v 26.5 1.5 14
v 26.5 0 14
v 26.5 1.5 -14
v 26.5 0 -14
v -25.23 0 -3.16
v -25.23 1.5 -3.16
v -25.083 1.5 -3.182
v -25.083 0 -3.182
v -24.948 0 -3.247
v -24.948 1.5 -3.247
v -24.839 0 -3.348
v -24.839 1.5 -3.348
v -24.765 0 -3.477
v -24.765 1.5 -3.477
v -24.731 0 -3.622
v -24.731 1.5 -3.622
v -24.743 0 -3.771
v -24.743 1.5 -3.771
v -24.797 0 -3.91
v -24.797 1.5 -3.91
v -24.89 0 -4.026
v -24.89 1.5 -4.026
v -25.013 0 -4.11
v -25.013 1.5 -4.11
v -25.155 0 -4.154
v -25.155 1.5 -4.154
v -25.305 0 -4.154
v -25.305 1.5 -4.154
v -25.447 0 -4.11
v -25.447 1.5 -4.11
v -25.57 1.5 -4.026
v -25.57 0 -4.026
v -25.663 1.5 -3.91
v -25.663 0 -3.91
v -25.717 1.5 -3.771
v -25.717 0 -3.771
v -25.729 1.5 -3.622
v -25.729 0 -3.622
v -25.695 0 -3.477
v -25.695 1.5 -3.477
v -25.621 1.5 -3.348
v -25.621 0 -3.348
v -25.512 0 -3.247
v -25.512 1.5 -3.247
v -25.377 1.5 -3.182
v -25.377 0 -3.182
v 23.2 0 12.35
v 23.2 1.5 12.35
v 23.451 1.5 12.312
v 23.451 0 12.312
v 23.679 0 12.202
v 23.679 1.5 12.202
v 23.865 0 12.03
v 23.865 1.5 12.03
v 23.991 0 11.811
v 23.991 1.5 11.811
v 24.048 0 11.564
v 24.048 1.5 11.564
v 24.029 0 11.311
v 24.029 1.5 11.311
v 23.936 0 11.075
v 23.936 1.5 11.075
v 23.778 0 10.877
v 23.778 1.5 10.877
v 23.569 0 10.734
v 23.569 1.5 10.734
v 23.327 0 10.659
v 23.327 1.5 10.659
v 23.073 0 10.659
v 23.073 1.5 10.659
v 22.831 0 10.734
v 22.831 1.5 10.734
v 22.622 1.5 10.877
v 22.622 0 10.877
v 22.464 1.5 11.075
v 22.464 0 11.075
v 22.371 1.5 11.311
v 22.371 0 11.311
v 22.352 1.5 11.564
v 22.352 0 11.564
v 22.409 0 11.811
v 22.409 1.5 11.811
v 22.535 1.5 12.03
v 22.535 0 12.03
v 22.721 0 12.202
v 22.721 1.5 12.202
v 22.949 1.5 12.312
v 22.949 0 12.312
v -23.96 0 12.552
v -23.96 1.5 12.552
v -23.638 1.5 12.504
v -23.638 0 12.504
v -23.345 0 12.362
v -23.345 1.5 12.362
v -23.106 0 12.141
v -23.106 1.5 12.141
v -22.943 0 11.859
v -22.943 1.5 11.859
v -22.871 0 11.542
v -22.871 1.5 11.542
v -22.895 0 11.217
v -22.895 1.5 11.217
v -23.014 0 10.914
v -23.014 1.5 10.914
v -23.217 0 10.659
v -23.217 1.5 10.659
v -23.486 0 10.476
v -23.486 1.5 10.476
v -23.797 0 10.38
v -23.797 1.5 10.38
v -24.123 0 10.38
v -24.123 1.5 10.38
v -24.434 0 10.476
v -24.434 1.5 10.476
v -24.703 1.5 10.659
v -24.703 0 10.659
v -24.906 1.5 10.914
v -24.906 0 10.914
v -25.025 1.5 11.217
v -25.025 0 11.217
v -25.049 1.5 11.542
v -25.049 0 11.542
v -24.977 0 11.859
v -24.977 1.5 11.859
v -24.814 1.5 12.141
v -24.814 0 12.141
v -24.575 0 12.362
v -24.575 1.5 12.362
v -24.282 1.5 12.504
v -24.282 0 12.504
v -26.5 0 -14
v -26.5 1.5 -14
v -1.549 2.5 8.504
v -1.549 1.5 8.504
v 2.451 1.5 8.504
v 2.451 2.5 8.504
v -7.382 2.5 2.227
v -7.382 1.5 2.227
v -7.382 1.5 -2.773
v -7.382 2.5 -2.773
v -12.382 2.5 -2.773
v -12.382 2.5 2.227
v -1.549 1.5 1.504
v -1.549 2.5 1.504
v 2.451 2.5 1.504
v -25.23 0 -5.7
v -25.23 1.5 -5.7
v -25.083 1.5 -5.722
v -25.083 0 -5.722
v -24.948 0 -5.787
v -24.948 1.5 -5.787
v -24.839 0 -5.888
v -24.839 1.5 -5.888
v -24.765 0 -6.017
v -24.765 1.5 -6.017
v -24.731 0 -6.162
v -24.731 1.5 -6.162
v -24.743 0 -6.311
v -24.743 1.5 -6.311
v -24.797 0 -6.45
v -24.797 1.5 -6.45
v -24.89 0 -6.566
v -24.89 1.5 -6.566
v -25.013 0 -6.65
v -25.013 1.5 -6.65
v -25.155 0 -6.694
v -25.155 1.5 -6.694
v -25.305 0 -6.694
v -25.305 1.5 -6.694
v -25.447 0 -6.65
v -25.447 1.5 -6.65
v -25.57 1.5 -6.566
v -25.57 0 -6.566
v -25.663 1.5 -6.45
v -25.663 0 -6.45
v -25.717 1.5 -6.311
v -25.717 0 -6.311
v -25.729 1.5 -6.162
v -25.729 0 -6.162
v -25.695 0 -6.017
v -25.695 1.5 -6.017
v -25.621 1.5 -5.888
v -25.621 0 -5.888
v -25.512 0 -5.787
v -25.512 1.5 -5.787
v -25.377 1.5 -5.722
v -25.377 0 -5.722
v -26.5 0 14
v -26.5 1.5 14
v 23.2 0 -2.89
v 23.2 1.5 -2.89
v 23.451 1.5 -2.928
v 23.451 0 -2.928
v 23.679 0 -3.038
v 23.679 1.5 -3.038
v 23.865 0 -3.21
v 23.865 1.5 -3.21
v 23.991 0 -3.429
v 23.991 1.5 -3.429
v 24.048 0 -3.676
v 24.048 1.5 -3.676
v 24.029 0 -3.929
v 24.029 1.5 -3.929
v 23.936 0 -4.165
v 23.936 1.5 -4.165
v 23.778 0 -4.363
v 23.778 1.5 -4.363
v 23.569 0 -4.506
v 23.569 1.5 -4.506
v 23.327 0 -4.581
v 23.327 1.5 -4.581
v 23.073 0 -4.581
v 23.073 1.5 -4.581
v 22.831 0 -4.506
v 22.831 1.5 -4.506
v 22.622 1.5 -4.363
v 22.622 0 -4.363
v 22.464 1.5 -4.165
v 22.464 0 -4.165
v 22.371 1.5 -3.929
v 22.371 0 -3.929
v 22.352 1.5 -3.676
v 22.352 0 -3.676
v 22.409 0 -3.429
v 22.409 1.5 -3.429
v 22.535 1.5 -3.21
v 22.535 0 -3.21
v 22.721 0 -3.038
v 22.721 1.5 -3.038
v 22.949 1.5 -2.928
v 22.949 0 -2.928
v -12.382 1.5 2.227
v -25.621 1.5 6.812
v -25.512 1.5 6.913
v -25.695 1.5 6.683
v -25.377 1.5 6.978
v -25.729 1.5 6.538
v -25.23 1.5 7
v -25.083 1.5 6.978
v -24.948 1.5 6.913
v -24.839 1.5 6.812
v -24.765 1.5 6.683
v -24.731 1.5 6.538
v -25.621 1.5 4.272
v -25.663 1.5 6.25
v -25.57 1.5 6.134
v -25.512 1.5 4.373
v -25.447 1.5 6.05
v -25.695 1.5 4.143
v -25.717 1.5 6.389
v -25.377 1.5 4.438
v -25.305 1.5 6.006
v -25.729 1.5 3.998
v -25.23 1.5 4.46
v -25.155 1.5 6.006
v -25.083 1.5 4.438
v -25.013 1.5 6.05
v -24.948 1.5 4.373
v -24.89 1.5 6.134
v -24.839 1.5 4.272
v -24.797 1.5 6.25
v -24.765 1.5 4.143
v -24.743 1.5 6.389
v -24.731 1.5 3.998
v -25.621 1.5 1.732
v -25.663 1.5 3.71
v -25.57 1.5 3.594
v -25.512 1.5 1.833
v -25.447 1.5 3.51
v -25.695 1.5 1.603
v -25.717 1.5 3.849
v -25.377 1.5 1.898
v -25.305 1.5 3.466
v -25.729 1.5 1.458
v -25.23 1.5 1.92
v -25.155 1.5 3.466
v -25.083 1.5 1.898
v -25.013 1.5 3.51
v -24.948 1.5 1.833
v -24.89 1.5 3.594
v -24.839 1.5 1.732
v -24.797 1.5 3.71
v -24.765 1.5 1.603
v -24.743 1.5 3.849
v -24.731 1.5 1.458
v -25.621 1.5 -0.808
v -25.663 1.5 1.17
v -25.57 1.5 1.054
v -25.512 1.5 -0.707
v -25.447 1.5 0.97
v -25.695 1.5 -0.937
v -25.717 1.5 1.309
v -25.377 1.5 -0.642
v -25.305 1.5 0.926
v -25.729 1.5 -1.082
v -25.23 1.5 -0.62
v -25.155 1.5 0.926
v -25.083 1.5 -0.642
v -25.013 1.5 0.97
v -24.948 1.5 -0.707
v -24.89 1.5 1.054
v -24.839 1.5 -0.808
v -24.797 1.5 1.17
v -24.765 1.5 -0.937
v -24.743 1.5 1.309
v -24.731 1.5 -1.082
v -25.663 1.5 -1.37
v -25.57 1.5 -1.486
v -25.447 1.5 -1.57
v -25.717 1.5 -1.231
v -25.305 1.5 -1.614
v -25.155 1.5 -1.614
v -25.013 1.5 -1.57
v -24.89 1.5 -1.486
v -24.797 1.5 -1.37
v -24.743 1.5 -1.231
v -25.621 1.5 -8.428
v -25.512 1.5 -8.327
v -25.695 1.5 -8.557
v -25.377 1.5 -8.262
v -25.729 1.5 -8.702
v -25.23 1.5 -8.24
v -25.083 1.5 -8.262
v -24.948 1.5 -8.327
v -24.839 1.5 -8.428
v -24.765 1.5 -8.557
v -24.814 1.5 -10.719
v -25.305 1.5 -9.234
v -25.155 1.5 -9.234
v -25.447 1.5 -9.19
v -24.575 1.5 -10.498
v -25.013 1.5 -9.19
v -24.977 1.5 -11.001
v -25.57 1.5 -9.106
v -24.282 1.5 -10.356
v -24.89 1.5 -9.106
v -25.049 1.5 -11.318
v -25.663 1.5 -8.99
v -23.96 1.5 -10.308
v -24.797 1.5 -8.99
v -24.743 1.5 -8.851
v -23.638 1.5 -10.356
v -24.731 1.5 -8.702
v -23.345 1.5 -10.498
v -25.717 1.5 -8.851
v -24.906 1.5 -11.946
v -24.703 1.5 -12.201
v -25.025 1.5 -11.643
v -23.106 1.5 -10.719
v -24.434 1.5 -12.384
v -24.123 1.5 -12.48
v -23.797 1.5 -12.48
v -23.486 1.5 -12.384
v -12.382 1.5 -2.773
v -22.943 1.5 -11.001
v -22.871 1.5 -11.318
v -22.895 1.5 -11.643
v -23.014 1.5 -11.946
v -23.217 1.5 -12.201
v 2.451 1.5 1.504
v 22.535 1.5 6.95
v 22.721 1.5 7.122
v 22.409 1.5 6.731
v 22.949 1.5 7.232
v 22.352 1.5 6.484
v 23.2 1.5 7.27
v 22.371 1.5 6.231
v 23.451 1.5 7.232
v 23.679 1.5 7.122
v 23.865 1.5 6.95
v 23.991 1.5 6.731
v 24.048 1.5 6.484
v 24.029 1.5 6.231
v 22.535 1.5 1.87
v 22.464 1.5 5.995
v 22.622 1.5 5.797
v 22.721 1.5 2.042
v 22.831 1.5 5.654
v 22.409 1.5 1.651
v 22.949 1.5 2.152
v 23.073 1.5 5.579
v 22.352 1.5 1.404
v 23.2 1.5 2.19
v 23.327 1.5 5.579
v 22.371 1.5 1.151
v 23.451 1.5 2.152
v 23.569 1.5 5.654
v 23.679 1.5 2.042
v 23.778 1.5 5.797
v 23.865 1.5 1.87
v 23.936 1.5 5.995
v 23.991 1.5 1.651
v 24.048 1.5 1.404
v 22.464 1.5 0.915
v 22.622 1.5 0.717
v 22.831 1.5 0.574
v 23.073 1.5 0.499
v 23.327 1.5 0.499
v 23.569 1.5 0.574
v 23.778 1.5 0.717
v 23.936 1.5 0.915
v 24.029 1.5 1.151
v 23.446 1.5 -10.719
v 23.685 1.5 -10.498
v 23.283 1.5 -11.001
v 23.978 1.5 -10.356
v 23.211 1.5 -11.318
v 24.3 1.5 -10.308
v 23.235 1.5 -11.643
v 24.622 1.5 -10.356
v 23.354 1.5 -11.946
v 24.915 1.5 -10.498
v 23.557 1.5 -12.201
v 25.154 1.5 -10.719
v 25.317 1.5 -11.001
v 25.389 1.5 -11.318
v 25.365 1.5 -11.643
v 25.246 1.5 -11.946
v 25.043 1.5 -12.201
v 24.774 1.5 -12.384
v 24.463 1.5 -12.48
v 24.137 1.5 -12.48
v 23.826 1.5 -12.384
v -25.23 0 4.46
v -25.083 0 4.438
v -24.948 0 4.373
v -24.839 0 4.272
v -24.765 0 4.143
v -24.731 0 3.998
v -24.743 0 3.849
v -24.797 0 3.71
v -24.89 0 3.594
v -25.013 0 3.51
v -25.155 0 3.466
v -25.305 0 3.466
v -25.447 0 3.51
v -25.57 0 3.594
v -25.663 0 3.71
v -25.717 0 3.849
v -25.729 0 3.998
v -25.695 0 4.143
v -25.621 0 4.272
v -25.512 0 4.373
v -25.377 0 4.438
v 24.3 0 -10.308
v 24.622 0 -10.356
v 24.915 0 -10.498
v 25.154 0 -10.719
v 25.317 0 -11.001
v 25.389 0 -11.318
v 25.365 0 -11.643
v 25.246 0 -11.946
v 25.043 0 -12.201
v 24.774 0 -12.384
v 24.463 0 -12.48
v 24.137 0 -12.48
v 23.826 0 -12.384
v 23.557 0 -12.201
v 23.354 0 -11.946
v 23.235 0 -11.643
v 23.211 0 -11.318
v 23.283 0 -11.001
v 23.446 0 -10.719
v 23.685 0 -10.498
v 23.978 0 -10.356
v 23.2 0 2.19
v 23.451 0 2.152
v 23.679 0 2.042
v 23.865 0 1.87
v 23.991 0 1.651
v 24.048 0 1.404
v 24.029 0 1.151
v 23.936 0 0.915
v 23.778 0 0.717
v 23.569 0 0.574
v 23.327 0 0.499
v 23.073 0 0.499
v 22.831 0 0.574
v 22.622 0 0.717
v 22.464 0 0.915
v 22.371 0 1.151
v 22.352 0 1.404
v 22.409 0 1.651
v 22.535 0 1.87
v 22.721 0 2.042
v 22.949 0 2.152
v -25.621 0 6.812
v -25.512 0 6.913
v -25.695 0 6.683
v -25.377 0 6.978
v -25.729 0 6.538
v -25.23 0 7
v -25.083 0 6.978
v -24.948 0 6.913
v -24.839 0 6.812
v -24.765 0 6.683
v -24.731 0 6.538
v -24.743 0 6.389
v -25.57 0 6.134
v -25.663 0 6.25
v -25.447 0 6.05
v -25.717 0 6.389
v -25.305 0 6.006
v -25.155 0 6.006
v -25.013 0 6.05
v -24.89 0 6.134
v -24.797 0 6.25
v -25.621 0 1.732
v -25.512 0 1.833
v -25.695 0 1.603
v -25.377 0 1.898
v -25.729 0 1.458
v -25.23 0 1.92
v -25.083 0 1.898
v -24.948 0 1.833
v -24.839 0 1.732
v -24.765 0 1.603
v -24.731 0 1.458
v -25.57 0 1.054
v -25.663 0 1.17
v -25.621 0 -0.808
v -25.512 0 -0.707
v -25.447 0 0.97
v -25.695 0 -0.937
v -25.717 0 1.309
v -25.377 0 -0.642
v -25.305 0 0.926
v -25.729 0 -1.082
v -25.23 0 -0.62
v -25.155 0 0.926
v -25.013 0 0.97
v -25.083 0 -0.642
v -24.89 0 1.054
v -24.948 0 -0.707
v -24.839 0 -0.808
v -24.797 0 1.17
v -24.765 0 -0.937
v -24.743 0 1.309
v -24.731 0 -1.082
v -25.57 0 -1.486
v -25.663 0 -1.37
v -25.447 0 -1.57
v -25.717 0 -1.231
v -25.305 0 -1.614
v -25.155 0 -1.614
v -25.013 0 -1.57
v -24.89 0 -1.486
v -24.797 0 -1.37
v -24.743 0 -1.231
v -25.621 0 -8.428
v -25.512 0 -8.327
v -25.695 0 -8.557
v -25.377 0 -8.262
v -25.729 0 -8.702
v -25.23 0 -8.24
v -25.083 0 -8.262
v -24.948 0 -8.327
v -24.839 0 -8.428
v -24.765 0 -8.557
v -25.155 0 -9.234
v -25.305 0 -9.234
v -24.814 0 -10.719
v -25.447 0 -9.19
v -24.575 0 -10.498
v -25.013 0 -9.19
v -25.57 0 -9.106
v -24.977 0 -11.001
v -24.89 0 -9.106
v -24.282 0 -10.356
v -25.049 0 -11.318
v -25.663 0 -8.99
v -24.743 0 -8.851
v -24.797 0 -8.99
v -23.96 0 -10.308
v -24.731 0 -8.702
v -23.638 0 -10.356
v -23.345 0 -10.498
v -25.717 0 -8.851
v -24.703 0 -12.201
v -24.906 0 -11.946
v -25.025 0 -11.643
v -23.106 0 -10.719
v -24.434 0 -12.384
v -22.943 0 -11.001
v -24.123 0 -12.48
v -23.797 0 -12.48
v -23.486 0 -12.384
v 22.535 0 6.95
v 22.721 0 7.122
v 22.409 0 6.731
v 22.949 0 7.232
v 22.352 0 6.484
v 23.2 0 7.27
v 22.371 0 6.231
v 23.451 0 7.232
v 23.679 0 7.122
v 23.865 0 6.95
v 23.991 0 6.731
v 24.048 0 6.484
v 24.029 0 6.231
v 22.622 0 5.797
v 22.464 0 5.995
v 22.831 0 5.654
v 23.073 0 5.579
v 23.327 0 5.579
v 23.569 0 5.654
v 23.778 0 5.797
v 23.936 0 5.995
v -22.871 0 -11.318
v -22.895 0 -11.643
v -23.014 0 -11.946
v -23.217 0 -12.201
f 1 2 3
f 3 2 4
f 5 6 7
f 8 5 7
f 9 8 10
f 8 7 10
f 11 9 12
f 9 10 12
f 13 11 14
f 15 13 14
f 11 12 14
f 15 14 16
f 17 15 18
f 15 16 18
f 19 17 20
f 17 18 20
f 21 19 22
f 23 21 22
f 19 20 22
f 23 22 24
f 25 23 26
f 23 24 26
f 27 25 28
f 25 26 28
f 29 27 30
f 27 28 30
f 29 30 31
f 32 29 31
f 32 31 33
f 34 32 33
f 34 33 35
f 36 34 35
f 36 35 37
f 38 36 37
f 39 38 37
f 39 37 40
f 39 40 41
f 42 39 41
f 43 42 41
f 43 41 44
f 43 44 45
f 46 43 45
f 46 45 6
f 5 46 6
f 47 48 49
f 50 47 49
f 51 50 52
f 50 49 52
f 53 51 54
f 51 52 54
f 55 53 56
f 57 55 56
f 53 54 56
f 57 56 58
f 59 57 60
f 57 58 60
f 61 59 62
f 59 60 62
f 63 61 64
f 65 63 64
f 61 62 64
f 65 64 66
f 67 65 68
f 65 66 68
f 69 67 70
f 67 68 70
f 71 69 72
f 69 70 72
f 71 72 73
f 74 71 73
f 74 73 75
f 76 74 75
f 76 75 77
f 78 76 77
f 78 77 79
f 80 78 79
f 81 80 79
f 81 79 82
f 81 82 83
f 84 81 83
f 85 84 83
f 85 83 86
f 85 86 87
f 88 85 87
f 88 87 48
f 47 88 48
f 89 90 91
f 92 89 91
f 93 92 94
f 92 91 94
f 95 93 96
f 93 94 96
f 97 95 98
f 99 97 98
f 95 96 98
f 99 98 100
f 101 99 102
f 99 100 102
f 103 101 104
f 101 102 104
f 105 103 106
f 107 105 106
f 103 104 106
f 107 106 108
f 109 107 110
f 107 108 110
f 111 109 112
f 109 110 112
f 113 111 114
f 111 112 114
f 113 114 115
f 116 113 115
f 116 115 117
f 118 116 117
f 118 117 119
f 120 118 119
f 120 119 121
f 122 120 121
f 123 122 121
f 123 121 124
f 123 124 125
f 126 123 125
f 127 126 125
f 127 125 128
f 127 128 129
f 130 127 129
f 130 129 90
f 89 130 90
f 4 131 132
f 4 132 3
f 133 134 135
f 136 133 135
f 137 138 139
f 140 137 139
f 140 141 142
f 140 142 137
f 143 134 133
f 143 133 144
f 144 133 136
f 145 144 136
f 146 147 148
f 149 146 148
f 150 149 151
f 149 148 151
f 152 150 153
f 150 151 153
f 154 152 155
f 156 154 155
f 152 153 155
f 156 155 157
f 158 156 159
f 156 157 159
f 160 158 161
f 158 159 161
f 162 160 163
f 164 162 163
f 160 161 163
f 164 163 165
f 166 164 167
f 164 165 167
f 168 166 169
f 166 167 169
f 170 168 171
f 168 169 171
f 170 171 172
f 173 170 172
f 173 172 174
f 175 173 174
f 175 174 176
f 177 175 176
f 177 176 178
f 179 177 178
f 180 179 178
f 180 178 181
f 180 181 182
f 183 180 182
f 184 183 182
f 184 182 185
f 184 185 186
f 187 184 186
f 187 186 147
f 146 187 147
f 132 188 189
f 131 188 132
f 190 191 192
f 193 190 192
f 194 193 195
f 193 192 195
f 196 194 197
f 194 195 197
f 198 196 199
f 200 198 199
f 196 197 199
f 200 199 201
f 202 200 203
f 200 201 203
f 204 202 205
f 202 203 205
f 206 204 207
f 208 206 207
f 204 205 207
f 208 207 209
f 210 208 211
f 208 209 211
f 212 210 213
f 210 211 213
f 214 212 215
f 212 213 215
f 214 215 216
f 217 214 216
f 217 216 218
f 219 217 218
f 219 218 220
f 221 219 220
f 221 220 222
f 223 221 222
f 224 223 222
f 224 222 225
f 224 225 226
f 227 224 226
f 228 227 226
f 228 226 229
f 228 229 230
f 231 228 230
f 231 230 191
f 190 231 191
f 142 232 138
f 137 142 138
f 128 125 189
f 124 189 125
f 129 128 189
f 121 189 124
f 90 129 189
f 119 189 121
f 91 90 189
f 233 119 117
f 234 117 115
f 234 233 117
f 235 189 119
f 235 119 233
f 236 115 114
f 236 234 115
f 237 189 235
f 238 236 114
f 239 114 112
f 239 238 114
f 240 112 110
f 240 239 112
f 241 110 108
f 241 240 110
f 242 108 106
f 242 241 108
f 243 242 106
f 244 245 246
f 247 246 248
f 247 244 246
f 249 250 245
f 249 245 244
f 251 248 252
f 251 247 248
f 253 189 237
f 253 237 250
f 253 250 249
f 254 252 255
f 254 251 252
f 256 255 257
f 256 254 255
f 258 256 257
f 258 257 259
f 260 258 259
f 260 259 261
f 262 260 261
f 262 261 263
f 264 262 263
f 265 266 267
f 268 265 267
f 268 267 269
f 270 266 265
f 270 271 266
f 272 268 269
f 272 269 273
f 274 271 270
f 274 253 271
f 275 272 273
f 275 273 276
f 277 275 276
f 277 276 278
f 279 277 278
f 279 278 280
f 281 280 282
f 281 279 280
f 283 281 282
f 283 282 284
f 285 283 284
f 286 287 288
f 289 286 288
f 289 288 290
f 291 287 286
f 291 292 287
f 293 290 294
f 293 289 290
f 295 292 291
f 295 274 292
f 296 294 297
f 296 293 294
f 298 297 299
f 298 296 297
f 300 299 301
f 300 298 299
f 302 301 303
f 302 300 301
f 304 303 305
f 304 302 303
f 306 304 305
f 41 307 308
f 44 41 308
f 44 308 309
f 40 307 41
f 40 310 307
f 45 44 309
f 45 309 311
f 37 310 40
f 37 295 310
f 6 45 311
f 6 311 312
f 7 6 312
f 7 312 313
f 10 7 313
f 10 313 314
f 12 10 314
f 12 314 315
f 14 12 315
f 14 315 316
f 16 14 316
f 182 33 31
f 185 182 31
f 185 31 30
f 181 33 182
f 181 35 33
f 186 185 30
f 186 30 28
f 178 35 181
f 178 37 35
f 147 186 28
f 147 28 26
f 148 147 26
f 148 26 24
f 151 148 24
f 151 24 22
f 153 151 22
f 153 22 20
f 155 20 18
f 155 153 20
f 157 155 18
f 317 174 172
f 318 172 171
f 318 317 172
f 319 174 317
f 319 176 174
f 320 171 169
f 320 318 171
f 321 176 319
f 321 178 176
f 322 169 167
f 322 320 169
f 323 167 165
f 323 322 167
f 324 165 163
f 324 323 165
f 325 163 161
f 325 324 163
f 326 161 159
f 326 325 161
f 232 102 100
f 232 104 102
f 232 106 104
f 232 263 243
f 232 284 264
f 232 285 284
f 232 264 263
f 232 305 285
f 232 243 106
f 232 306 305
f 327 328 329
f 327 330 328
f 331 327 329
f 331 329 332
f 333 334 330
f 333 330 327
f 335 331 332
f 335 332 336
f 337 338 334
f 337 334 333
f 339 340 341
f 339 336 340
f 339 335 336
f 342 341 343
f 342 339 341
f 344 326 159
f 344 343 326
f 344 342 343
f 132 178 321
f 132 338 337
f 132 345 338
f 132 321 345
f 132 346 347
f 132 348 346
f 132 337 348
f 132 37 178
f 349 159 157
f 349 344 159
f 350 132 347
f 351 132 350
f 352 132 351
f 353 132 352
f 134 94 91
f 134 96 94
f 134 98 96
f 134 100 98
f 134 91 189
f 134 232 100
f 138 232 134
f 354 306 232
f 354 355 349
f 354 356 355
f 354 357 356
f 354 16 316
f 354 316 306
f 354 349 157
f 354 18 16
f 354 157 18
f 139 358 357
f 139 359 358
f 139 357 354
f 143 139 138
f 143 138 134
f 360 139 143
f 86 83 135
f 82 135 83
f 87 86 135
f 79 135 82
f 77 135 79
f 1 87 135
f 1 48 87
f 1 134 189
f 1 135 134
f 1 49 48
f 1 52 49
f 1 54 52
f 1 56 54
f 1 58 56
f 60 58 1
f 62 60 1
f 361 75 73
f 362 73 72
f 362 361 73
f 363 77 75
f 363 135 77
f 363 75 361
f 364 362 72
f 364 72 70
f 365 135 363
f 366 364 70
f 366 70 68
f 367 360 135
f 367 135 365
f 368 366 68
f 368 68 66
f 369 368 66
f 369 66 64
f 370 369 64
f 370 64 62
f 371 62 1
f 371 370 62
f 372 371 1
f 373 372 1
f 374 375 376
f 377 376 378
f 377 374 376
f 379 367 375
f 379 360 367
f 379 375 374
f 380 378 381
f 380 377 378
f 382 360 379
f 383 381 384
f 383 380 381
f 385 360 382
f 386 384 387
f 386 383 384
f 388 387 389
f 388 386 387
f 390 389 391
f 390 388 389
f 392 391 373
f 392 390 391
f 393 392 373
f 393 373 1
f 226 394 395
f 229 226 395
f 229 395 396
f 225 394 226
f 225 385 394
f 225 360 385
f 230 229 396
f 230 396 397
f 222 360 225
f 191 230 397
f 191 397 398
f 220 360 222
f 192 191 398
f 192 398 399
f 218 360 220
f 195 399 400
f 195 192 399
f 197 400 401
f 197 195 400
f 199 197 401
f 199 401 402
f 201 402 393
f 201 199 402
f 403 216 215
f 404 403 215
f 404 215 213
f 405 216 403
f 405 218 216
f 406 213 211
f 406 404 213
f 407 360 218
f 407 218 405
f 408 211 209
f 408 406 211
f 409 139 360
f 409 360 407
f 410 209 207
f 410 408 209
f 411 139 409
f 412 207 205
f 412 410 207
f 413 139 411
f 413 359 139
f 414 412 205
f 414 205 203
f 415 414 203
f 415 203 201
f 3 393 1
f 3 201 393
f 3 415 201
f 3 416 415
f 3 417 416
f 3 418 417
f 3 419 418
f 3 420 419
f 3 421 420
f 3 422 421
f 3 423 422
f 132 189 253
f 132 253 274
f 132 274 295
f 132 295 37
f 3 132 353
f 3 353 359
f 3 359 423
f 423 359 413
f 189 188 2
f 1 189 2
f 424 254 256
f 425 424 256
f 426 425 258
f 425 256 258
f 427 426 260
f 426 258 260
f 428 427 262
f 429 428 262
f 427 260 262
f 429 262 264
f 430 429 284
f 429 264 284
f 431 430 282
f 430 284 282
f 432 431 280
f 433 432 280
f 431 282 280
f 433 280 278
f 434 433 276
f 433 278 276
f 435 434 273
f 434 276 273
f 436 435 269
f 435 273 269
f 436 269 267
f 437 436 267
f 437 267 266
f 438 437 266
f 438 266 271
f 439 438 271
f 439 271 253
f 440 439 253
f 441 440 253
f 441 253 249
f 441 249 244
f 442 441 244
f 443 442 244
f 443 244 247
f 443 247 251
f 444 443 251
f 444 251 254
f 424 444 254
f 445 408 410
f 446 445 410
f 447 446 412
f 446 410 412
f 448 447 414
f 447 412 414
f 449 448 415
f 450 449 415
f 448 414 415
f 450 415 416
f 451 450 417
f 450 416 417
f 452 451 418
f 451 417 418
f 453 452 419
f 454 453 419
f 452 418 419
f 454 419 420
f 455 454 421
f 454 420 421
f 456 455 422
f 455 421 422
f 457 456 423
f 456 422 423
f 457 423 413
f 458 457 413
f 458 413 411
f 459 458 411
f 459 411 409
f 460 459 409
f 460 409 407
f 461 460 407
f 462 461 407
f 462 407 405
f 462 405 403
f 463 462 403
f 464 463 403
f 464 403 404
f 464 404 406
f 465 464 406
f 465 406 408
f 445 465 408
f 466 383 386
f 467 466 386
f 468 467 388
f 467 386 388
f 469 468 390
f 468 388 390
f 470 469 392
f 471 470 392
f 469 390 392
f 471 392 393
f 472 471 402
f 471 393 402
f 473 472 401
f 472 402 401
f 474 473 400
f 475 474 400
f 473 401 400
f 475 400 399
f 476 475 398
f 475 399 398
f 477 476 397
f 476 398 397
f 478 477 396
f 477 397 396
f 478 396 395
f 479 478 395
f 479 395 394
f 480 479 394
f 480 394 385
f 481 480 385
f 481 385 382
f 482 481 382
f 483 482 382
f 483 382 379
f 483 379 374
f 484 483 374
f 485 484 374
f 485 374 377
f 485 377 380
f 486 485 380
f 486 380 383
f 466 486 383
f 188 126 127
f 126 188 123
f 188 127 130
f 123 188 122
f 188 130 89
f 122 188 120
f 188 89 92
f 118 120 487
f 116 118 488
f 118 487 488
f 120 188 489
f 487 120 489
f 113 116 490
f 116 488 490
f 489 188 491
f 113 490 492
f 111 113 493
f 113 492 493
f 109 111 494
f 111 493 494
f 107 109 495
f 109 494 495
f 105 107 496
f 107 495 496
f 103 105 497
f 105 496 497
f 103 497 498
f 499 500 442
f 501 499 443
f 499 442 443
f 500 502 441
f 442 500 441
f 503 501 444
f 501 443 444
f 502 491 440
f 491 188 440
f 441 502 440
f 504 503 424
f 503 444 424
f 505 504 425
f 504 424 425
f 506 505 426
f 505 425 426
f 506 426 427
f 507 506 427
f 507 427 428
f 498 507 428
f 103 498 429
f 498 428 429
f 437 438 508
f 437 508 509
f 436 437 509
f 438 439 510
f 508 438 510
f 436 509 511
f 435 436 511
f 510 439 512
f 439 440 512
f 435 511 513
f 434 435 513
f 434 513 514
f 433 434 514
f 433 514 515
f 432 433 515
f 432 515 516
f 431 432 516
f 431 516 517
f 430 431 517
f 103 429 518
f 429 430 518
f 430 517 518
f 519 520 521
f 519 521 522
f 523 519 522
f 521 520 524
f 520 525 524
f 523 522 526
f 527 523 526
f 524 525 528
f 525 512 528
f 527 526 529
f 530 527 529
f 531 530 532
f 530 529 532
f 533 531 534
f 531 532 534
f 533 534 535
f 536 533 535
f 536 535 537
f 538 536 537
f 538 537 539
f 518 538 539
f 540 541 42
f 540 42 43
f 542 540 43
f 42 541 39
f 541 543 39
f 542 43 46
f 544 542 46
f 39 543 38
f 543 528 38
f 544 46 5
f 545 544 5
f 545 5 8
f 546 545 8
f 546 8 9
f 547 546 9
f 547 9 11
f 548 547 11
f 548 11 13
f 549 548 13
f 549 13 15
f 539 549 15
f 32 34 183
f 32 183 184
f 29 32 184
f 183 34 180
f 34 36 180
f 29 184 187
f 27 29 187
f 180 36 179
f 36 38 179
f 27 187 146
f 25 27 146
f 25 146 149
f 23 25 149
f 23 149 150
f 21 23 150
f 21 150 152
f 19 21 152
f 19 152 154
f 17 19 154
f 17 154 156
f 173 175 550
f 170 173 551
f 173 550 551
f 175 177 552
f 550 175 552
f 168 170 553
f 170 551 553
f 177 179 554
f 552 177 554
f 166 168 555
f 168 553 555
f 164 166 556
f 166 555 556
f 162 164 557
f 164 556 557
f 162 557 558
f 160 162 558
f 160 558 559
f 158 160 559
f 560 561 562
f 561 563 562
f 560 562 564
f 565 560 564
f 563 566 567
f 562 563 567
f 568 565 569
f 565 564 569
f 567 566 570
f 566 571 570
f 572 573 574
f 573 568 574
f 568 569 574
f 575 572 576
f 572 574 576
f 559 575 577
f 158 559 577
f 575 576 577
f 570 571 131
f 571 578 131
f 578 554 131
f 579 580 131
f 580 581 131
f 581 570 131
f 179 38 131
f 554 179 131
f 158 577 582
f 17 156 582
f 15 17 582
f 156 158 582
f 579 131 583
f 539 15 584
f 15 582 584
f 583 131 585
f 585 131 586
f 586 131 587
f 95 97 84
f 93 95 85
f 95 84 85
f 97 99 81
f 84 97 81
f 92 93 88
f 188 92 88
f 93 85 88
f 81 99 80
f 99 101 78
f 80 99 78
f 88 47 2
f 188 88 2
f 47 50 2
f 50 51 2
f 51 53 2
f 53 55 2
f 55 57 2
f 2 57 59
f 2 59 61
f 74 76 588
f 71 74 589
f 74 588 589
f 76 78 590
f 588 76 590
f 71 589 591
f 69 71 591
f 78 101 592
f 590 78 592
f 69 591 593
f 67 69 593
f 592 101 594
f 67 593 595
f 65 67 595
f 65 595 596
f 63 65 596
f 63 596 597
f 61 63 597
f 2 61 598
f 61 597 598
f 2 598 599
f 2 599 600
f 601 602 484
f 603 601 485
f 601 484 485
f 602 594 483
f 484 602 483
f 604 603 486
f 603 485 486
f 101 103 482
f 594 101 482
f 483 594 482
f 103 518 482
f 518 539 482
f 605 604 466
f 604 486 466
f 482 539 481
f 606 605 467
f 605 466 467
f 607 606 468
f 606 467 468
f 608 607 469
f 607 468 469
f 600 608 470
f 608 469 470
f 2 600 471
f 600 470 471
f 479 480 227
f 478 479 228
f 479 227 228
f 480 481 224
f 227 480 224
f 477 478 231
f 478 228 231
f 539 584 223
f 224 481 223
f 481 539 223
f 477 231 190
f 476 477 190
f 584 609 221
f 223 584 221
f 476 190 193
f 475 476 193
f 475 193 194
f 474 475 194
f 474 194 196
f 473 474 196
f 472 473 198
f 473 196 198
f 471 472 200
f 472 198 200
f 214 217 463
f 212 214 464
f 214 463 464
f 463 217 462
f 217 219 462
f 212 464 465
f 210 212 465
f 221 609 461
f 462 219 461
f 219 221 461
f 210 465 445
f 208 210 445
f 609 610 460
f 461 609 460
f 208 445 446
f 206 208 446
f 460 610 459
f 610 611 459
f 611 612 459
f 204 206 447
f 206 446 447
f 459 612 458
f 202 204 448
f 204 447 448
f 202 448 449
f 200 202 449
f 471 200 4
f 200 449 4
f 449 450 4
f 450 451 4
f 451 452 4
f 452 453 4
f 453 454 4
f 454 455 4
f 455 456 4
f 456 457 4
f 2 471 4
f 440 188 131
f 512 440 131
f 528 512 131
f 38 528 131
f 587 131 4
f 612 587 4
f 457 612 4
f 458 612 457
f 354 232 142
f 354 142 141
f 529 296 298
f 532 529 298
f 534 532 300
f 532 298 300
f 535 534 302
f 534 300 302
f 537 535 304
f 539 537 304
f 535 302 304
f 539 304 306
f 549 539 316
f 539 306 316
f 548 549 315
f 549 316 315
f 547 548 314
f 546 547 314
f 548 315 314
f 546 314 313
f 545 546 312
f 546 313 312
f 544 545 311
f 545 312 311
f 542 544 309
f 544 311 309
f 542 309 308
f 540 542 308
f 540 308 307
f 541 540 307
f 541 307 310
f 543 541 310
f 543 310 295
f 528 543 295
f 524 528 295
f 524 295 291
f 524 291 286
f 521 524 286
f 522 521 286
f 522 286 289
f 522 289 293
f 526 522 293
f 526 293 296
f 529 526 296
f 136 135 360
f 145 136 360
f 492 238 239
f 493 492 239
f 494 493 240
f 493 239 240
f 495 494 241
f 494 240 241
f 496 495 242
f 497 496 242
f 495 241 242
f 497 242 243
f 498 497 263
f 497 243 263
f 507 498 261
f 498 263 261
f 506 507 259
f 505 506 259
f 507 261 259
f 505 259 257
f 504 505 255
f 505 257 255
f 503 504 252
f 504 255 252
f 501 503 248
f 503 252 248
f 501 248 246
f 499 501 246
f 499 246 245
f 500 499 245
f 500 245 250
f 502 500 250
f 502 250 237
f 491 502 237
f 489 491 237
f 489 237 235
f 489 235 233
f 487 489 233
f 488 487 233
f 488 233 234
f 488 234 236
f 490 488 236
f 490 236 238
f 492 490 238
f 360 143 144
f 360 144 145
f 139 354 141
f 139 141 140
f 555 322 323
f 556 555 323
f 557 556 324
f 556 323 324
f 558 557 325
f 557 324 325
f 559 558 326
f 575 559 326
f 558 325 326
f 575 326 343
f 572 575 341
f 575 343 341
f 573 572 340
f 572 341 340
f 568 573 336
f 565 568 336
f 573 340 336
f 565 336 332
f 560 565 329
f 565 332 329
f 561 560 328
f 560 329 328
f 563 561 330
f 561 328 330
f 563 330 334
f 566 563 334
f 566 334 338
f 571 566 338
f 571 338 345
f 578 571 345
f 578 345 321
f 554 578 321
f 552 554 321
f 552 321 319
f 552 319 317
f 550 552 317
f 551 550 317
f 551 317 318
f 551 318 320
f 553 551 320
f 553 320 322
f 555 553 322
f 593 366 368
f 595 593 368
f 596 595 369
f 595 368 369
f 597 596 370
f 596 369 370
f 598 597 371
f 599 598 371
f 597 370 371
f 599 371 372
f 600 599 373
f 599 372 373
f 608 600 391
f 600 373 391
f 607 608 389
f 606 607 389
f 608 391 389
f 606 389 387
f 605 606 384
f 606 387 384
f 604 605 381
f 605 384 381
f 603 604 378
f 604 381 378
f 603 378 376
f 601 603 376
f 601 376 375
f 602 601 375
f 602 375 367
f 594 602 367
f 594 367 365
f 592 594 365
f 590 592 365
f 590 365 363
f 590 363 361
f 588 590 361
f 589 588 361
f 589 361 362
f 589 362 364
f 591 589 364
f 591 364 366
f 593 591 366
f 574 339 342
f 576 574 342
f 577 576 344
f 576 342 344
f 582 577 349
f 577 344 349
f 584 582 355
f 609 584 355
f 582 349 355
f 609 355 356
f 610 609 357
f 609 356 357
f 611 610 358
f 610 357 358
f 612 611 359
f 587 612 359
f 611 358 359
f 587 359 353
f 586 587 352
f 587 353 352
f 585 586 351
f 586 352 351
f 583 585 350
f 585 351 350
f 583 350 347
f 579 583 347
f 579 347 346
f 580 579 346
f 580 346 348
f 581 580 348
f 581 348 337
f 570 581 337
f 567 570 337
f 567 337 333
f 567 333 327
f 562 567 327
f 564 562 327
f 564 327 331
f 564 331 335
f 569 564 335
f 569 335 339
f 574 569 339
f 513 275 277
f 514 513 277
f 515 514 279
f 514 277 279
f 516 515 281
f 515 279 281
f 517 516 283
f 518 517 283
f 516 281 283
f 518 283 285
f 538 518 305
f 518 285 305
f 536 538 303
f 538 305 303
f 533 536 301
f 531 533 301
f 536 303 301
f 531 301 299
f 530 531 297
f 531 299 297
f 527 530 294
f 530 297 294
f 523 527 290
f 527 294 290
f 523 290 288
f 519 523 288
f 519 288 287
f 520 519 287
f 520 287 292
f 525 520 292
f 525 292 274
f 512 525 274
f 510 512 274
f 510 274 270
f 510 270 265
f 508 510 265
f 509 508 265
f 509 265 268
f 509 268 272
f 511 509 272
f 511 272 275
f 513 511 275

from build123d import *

# Parameters (mm, degrees)
SKETCH1_W            = 53
SKETCH1_H            = 28
BOSS_EXTRUDE1_DEPTH  = 1.5
SKETCH2_R            = 1.0922
CUT_EXTRUDE1_DEPTH   = 31.008332176
LPATTERN1_COUNT      = 2
LPATTERN1_PITCH      = 22.86
LPATTERN1_COUNT_DIR2 = 2
LPATTERN1_PITCH_DIR2 = 48.26
SKETCH3_R            = 0.5
CUT_EXTRUDE2_DEPTH   = 31.008332176
LPATTERN2_COUNT      = 7
LPATTERN2_PITCH      = 2.54
SKETCH5_R            = 0.85
CUT_EXTRUDE3_DEPTH   = 31.008332176
LPATTERN4_COUNT      = 4
LPATTERN4_PITCH      = 5.08
SKETCH6_W            = 5
SKETCH6_H            = 5
SKETCH6_W_2          = 4
SKETCH6_H_2          = 7
BOSS_EXTRUDE3_DEPTH  = 1


with BuildPart() as part:
    # Sketch1 → Boss-Extrude1 (new body)
    with BuildSketch(Plane(origin=(0, 0, 0), x_dir=(1, 0, 0), z_dir=(0, 1, 0))):
        Rectangle(SKETCH1_W, SKETCH1_H)
    extrude(amount=BOSS_EXTRUDE1_DEPTH)

    # Sketch2 → Cut-Extrude1 (cut, through all)
    with BuildSketch(Plane(origin=(0, 1.5, 0), x_dir=(1, 0, 0), z_dir=(0, 1, 0))):
        with Locations(Location((-23.96, -11.46, 0), (0, 0, 270))):
            Circle(SKETCH2_R)
    cut_extrude1 = extrude(amount=-CUT_EXTRUDE1_DEPTH, mode=Mode.SUBTRACT)

    # LPattern1: Cut-Extrude1 2 × 2, 1 skipped
    with Locations(*[(j * LPATTERN1_PITCH_DIR2, 0, -i * LPATTERN1_PITCH) for i in range(LPATTERN1_COUNT) for j in range(LPATTERN1_COUNT_DIR2) if (i, j) not in ((0, 0), (0, 1))]):
        add(cut_extrude1, mode=Mode.SUBTRACT)

    # Sketch3 → Cut-Extrude2 (cut, through all)
    with BuildSketch(Plane(origin=(0, 1.5, 0), x_dir=(1, 0, 0), z_dir=(0, 1, 0))):
        with Locations(Location((-25.23, 8.739816389, 0), (0, 0, 270))):
            Circle(SKETCH3_R)
    cut_extrude2 = extrude(amount=-CUT_EXTRUDE2_DEPTH, mode=Mode.SUBTRACT)

    # LPattern2: Cut-Extrude2 ×7
    with Locations(*[(0, 0, i * LPATTERN2_PITCH) for i in range(1, LPATTERN2_COUNT)]):
        add(cut_extrude2, mode=Mode.SUBTRACT)

    # Sketch5 → Cut-Extrude3 (cut, through all)
    with BuildSketch(Plane(origin=(0, 1.5, 0), x_dir=(1, 0, 0), z_dir=(0, 1, 0))):
        with Locations(Location((23.2, -11.5, 0), (0, 0, 270))):
            Circle(SKETCH5_R)
    cut_extrude3 = extrude(amount=-CUT_EXTRUDE3_DEPTH, mode=Mode.SUBTRACT)

    # LPattern4: Cut-Extrude3 ×4
    with Locations(*[(0, 0, -i * LPATTERN4_PITCH) for i in range(1, LPATTERN4_COUNT)]):
        add(cut_extrude3, mode=Mode.SUBTRACT)

    # Sketch6 → Boss-Extrude3 (add)
    with BuildSketch(Plane(origin=(0, 1.5, 0), x_dir=(1, 0, 0), z_dir=(0, 1, 0))):
        with Locations((-9.881626536, 0.272798855)):
            Rectangle(SKETCH6_W, SKETCH6_H)
        with Locations((0.450562485, -5.004455937)):
            Rectangle(SKETCH6_W_2, SKETCH6_H_2)
    extrude(amount=BOSS_EXTRUDE3_DEPTH)


solid = part.part
